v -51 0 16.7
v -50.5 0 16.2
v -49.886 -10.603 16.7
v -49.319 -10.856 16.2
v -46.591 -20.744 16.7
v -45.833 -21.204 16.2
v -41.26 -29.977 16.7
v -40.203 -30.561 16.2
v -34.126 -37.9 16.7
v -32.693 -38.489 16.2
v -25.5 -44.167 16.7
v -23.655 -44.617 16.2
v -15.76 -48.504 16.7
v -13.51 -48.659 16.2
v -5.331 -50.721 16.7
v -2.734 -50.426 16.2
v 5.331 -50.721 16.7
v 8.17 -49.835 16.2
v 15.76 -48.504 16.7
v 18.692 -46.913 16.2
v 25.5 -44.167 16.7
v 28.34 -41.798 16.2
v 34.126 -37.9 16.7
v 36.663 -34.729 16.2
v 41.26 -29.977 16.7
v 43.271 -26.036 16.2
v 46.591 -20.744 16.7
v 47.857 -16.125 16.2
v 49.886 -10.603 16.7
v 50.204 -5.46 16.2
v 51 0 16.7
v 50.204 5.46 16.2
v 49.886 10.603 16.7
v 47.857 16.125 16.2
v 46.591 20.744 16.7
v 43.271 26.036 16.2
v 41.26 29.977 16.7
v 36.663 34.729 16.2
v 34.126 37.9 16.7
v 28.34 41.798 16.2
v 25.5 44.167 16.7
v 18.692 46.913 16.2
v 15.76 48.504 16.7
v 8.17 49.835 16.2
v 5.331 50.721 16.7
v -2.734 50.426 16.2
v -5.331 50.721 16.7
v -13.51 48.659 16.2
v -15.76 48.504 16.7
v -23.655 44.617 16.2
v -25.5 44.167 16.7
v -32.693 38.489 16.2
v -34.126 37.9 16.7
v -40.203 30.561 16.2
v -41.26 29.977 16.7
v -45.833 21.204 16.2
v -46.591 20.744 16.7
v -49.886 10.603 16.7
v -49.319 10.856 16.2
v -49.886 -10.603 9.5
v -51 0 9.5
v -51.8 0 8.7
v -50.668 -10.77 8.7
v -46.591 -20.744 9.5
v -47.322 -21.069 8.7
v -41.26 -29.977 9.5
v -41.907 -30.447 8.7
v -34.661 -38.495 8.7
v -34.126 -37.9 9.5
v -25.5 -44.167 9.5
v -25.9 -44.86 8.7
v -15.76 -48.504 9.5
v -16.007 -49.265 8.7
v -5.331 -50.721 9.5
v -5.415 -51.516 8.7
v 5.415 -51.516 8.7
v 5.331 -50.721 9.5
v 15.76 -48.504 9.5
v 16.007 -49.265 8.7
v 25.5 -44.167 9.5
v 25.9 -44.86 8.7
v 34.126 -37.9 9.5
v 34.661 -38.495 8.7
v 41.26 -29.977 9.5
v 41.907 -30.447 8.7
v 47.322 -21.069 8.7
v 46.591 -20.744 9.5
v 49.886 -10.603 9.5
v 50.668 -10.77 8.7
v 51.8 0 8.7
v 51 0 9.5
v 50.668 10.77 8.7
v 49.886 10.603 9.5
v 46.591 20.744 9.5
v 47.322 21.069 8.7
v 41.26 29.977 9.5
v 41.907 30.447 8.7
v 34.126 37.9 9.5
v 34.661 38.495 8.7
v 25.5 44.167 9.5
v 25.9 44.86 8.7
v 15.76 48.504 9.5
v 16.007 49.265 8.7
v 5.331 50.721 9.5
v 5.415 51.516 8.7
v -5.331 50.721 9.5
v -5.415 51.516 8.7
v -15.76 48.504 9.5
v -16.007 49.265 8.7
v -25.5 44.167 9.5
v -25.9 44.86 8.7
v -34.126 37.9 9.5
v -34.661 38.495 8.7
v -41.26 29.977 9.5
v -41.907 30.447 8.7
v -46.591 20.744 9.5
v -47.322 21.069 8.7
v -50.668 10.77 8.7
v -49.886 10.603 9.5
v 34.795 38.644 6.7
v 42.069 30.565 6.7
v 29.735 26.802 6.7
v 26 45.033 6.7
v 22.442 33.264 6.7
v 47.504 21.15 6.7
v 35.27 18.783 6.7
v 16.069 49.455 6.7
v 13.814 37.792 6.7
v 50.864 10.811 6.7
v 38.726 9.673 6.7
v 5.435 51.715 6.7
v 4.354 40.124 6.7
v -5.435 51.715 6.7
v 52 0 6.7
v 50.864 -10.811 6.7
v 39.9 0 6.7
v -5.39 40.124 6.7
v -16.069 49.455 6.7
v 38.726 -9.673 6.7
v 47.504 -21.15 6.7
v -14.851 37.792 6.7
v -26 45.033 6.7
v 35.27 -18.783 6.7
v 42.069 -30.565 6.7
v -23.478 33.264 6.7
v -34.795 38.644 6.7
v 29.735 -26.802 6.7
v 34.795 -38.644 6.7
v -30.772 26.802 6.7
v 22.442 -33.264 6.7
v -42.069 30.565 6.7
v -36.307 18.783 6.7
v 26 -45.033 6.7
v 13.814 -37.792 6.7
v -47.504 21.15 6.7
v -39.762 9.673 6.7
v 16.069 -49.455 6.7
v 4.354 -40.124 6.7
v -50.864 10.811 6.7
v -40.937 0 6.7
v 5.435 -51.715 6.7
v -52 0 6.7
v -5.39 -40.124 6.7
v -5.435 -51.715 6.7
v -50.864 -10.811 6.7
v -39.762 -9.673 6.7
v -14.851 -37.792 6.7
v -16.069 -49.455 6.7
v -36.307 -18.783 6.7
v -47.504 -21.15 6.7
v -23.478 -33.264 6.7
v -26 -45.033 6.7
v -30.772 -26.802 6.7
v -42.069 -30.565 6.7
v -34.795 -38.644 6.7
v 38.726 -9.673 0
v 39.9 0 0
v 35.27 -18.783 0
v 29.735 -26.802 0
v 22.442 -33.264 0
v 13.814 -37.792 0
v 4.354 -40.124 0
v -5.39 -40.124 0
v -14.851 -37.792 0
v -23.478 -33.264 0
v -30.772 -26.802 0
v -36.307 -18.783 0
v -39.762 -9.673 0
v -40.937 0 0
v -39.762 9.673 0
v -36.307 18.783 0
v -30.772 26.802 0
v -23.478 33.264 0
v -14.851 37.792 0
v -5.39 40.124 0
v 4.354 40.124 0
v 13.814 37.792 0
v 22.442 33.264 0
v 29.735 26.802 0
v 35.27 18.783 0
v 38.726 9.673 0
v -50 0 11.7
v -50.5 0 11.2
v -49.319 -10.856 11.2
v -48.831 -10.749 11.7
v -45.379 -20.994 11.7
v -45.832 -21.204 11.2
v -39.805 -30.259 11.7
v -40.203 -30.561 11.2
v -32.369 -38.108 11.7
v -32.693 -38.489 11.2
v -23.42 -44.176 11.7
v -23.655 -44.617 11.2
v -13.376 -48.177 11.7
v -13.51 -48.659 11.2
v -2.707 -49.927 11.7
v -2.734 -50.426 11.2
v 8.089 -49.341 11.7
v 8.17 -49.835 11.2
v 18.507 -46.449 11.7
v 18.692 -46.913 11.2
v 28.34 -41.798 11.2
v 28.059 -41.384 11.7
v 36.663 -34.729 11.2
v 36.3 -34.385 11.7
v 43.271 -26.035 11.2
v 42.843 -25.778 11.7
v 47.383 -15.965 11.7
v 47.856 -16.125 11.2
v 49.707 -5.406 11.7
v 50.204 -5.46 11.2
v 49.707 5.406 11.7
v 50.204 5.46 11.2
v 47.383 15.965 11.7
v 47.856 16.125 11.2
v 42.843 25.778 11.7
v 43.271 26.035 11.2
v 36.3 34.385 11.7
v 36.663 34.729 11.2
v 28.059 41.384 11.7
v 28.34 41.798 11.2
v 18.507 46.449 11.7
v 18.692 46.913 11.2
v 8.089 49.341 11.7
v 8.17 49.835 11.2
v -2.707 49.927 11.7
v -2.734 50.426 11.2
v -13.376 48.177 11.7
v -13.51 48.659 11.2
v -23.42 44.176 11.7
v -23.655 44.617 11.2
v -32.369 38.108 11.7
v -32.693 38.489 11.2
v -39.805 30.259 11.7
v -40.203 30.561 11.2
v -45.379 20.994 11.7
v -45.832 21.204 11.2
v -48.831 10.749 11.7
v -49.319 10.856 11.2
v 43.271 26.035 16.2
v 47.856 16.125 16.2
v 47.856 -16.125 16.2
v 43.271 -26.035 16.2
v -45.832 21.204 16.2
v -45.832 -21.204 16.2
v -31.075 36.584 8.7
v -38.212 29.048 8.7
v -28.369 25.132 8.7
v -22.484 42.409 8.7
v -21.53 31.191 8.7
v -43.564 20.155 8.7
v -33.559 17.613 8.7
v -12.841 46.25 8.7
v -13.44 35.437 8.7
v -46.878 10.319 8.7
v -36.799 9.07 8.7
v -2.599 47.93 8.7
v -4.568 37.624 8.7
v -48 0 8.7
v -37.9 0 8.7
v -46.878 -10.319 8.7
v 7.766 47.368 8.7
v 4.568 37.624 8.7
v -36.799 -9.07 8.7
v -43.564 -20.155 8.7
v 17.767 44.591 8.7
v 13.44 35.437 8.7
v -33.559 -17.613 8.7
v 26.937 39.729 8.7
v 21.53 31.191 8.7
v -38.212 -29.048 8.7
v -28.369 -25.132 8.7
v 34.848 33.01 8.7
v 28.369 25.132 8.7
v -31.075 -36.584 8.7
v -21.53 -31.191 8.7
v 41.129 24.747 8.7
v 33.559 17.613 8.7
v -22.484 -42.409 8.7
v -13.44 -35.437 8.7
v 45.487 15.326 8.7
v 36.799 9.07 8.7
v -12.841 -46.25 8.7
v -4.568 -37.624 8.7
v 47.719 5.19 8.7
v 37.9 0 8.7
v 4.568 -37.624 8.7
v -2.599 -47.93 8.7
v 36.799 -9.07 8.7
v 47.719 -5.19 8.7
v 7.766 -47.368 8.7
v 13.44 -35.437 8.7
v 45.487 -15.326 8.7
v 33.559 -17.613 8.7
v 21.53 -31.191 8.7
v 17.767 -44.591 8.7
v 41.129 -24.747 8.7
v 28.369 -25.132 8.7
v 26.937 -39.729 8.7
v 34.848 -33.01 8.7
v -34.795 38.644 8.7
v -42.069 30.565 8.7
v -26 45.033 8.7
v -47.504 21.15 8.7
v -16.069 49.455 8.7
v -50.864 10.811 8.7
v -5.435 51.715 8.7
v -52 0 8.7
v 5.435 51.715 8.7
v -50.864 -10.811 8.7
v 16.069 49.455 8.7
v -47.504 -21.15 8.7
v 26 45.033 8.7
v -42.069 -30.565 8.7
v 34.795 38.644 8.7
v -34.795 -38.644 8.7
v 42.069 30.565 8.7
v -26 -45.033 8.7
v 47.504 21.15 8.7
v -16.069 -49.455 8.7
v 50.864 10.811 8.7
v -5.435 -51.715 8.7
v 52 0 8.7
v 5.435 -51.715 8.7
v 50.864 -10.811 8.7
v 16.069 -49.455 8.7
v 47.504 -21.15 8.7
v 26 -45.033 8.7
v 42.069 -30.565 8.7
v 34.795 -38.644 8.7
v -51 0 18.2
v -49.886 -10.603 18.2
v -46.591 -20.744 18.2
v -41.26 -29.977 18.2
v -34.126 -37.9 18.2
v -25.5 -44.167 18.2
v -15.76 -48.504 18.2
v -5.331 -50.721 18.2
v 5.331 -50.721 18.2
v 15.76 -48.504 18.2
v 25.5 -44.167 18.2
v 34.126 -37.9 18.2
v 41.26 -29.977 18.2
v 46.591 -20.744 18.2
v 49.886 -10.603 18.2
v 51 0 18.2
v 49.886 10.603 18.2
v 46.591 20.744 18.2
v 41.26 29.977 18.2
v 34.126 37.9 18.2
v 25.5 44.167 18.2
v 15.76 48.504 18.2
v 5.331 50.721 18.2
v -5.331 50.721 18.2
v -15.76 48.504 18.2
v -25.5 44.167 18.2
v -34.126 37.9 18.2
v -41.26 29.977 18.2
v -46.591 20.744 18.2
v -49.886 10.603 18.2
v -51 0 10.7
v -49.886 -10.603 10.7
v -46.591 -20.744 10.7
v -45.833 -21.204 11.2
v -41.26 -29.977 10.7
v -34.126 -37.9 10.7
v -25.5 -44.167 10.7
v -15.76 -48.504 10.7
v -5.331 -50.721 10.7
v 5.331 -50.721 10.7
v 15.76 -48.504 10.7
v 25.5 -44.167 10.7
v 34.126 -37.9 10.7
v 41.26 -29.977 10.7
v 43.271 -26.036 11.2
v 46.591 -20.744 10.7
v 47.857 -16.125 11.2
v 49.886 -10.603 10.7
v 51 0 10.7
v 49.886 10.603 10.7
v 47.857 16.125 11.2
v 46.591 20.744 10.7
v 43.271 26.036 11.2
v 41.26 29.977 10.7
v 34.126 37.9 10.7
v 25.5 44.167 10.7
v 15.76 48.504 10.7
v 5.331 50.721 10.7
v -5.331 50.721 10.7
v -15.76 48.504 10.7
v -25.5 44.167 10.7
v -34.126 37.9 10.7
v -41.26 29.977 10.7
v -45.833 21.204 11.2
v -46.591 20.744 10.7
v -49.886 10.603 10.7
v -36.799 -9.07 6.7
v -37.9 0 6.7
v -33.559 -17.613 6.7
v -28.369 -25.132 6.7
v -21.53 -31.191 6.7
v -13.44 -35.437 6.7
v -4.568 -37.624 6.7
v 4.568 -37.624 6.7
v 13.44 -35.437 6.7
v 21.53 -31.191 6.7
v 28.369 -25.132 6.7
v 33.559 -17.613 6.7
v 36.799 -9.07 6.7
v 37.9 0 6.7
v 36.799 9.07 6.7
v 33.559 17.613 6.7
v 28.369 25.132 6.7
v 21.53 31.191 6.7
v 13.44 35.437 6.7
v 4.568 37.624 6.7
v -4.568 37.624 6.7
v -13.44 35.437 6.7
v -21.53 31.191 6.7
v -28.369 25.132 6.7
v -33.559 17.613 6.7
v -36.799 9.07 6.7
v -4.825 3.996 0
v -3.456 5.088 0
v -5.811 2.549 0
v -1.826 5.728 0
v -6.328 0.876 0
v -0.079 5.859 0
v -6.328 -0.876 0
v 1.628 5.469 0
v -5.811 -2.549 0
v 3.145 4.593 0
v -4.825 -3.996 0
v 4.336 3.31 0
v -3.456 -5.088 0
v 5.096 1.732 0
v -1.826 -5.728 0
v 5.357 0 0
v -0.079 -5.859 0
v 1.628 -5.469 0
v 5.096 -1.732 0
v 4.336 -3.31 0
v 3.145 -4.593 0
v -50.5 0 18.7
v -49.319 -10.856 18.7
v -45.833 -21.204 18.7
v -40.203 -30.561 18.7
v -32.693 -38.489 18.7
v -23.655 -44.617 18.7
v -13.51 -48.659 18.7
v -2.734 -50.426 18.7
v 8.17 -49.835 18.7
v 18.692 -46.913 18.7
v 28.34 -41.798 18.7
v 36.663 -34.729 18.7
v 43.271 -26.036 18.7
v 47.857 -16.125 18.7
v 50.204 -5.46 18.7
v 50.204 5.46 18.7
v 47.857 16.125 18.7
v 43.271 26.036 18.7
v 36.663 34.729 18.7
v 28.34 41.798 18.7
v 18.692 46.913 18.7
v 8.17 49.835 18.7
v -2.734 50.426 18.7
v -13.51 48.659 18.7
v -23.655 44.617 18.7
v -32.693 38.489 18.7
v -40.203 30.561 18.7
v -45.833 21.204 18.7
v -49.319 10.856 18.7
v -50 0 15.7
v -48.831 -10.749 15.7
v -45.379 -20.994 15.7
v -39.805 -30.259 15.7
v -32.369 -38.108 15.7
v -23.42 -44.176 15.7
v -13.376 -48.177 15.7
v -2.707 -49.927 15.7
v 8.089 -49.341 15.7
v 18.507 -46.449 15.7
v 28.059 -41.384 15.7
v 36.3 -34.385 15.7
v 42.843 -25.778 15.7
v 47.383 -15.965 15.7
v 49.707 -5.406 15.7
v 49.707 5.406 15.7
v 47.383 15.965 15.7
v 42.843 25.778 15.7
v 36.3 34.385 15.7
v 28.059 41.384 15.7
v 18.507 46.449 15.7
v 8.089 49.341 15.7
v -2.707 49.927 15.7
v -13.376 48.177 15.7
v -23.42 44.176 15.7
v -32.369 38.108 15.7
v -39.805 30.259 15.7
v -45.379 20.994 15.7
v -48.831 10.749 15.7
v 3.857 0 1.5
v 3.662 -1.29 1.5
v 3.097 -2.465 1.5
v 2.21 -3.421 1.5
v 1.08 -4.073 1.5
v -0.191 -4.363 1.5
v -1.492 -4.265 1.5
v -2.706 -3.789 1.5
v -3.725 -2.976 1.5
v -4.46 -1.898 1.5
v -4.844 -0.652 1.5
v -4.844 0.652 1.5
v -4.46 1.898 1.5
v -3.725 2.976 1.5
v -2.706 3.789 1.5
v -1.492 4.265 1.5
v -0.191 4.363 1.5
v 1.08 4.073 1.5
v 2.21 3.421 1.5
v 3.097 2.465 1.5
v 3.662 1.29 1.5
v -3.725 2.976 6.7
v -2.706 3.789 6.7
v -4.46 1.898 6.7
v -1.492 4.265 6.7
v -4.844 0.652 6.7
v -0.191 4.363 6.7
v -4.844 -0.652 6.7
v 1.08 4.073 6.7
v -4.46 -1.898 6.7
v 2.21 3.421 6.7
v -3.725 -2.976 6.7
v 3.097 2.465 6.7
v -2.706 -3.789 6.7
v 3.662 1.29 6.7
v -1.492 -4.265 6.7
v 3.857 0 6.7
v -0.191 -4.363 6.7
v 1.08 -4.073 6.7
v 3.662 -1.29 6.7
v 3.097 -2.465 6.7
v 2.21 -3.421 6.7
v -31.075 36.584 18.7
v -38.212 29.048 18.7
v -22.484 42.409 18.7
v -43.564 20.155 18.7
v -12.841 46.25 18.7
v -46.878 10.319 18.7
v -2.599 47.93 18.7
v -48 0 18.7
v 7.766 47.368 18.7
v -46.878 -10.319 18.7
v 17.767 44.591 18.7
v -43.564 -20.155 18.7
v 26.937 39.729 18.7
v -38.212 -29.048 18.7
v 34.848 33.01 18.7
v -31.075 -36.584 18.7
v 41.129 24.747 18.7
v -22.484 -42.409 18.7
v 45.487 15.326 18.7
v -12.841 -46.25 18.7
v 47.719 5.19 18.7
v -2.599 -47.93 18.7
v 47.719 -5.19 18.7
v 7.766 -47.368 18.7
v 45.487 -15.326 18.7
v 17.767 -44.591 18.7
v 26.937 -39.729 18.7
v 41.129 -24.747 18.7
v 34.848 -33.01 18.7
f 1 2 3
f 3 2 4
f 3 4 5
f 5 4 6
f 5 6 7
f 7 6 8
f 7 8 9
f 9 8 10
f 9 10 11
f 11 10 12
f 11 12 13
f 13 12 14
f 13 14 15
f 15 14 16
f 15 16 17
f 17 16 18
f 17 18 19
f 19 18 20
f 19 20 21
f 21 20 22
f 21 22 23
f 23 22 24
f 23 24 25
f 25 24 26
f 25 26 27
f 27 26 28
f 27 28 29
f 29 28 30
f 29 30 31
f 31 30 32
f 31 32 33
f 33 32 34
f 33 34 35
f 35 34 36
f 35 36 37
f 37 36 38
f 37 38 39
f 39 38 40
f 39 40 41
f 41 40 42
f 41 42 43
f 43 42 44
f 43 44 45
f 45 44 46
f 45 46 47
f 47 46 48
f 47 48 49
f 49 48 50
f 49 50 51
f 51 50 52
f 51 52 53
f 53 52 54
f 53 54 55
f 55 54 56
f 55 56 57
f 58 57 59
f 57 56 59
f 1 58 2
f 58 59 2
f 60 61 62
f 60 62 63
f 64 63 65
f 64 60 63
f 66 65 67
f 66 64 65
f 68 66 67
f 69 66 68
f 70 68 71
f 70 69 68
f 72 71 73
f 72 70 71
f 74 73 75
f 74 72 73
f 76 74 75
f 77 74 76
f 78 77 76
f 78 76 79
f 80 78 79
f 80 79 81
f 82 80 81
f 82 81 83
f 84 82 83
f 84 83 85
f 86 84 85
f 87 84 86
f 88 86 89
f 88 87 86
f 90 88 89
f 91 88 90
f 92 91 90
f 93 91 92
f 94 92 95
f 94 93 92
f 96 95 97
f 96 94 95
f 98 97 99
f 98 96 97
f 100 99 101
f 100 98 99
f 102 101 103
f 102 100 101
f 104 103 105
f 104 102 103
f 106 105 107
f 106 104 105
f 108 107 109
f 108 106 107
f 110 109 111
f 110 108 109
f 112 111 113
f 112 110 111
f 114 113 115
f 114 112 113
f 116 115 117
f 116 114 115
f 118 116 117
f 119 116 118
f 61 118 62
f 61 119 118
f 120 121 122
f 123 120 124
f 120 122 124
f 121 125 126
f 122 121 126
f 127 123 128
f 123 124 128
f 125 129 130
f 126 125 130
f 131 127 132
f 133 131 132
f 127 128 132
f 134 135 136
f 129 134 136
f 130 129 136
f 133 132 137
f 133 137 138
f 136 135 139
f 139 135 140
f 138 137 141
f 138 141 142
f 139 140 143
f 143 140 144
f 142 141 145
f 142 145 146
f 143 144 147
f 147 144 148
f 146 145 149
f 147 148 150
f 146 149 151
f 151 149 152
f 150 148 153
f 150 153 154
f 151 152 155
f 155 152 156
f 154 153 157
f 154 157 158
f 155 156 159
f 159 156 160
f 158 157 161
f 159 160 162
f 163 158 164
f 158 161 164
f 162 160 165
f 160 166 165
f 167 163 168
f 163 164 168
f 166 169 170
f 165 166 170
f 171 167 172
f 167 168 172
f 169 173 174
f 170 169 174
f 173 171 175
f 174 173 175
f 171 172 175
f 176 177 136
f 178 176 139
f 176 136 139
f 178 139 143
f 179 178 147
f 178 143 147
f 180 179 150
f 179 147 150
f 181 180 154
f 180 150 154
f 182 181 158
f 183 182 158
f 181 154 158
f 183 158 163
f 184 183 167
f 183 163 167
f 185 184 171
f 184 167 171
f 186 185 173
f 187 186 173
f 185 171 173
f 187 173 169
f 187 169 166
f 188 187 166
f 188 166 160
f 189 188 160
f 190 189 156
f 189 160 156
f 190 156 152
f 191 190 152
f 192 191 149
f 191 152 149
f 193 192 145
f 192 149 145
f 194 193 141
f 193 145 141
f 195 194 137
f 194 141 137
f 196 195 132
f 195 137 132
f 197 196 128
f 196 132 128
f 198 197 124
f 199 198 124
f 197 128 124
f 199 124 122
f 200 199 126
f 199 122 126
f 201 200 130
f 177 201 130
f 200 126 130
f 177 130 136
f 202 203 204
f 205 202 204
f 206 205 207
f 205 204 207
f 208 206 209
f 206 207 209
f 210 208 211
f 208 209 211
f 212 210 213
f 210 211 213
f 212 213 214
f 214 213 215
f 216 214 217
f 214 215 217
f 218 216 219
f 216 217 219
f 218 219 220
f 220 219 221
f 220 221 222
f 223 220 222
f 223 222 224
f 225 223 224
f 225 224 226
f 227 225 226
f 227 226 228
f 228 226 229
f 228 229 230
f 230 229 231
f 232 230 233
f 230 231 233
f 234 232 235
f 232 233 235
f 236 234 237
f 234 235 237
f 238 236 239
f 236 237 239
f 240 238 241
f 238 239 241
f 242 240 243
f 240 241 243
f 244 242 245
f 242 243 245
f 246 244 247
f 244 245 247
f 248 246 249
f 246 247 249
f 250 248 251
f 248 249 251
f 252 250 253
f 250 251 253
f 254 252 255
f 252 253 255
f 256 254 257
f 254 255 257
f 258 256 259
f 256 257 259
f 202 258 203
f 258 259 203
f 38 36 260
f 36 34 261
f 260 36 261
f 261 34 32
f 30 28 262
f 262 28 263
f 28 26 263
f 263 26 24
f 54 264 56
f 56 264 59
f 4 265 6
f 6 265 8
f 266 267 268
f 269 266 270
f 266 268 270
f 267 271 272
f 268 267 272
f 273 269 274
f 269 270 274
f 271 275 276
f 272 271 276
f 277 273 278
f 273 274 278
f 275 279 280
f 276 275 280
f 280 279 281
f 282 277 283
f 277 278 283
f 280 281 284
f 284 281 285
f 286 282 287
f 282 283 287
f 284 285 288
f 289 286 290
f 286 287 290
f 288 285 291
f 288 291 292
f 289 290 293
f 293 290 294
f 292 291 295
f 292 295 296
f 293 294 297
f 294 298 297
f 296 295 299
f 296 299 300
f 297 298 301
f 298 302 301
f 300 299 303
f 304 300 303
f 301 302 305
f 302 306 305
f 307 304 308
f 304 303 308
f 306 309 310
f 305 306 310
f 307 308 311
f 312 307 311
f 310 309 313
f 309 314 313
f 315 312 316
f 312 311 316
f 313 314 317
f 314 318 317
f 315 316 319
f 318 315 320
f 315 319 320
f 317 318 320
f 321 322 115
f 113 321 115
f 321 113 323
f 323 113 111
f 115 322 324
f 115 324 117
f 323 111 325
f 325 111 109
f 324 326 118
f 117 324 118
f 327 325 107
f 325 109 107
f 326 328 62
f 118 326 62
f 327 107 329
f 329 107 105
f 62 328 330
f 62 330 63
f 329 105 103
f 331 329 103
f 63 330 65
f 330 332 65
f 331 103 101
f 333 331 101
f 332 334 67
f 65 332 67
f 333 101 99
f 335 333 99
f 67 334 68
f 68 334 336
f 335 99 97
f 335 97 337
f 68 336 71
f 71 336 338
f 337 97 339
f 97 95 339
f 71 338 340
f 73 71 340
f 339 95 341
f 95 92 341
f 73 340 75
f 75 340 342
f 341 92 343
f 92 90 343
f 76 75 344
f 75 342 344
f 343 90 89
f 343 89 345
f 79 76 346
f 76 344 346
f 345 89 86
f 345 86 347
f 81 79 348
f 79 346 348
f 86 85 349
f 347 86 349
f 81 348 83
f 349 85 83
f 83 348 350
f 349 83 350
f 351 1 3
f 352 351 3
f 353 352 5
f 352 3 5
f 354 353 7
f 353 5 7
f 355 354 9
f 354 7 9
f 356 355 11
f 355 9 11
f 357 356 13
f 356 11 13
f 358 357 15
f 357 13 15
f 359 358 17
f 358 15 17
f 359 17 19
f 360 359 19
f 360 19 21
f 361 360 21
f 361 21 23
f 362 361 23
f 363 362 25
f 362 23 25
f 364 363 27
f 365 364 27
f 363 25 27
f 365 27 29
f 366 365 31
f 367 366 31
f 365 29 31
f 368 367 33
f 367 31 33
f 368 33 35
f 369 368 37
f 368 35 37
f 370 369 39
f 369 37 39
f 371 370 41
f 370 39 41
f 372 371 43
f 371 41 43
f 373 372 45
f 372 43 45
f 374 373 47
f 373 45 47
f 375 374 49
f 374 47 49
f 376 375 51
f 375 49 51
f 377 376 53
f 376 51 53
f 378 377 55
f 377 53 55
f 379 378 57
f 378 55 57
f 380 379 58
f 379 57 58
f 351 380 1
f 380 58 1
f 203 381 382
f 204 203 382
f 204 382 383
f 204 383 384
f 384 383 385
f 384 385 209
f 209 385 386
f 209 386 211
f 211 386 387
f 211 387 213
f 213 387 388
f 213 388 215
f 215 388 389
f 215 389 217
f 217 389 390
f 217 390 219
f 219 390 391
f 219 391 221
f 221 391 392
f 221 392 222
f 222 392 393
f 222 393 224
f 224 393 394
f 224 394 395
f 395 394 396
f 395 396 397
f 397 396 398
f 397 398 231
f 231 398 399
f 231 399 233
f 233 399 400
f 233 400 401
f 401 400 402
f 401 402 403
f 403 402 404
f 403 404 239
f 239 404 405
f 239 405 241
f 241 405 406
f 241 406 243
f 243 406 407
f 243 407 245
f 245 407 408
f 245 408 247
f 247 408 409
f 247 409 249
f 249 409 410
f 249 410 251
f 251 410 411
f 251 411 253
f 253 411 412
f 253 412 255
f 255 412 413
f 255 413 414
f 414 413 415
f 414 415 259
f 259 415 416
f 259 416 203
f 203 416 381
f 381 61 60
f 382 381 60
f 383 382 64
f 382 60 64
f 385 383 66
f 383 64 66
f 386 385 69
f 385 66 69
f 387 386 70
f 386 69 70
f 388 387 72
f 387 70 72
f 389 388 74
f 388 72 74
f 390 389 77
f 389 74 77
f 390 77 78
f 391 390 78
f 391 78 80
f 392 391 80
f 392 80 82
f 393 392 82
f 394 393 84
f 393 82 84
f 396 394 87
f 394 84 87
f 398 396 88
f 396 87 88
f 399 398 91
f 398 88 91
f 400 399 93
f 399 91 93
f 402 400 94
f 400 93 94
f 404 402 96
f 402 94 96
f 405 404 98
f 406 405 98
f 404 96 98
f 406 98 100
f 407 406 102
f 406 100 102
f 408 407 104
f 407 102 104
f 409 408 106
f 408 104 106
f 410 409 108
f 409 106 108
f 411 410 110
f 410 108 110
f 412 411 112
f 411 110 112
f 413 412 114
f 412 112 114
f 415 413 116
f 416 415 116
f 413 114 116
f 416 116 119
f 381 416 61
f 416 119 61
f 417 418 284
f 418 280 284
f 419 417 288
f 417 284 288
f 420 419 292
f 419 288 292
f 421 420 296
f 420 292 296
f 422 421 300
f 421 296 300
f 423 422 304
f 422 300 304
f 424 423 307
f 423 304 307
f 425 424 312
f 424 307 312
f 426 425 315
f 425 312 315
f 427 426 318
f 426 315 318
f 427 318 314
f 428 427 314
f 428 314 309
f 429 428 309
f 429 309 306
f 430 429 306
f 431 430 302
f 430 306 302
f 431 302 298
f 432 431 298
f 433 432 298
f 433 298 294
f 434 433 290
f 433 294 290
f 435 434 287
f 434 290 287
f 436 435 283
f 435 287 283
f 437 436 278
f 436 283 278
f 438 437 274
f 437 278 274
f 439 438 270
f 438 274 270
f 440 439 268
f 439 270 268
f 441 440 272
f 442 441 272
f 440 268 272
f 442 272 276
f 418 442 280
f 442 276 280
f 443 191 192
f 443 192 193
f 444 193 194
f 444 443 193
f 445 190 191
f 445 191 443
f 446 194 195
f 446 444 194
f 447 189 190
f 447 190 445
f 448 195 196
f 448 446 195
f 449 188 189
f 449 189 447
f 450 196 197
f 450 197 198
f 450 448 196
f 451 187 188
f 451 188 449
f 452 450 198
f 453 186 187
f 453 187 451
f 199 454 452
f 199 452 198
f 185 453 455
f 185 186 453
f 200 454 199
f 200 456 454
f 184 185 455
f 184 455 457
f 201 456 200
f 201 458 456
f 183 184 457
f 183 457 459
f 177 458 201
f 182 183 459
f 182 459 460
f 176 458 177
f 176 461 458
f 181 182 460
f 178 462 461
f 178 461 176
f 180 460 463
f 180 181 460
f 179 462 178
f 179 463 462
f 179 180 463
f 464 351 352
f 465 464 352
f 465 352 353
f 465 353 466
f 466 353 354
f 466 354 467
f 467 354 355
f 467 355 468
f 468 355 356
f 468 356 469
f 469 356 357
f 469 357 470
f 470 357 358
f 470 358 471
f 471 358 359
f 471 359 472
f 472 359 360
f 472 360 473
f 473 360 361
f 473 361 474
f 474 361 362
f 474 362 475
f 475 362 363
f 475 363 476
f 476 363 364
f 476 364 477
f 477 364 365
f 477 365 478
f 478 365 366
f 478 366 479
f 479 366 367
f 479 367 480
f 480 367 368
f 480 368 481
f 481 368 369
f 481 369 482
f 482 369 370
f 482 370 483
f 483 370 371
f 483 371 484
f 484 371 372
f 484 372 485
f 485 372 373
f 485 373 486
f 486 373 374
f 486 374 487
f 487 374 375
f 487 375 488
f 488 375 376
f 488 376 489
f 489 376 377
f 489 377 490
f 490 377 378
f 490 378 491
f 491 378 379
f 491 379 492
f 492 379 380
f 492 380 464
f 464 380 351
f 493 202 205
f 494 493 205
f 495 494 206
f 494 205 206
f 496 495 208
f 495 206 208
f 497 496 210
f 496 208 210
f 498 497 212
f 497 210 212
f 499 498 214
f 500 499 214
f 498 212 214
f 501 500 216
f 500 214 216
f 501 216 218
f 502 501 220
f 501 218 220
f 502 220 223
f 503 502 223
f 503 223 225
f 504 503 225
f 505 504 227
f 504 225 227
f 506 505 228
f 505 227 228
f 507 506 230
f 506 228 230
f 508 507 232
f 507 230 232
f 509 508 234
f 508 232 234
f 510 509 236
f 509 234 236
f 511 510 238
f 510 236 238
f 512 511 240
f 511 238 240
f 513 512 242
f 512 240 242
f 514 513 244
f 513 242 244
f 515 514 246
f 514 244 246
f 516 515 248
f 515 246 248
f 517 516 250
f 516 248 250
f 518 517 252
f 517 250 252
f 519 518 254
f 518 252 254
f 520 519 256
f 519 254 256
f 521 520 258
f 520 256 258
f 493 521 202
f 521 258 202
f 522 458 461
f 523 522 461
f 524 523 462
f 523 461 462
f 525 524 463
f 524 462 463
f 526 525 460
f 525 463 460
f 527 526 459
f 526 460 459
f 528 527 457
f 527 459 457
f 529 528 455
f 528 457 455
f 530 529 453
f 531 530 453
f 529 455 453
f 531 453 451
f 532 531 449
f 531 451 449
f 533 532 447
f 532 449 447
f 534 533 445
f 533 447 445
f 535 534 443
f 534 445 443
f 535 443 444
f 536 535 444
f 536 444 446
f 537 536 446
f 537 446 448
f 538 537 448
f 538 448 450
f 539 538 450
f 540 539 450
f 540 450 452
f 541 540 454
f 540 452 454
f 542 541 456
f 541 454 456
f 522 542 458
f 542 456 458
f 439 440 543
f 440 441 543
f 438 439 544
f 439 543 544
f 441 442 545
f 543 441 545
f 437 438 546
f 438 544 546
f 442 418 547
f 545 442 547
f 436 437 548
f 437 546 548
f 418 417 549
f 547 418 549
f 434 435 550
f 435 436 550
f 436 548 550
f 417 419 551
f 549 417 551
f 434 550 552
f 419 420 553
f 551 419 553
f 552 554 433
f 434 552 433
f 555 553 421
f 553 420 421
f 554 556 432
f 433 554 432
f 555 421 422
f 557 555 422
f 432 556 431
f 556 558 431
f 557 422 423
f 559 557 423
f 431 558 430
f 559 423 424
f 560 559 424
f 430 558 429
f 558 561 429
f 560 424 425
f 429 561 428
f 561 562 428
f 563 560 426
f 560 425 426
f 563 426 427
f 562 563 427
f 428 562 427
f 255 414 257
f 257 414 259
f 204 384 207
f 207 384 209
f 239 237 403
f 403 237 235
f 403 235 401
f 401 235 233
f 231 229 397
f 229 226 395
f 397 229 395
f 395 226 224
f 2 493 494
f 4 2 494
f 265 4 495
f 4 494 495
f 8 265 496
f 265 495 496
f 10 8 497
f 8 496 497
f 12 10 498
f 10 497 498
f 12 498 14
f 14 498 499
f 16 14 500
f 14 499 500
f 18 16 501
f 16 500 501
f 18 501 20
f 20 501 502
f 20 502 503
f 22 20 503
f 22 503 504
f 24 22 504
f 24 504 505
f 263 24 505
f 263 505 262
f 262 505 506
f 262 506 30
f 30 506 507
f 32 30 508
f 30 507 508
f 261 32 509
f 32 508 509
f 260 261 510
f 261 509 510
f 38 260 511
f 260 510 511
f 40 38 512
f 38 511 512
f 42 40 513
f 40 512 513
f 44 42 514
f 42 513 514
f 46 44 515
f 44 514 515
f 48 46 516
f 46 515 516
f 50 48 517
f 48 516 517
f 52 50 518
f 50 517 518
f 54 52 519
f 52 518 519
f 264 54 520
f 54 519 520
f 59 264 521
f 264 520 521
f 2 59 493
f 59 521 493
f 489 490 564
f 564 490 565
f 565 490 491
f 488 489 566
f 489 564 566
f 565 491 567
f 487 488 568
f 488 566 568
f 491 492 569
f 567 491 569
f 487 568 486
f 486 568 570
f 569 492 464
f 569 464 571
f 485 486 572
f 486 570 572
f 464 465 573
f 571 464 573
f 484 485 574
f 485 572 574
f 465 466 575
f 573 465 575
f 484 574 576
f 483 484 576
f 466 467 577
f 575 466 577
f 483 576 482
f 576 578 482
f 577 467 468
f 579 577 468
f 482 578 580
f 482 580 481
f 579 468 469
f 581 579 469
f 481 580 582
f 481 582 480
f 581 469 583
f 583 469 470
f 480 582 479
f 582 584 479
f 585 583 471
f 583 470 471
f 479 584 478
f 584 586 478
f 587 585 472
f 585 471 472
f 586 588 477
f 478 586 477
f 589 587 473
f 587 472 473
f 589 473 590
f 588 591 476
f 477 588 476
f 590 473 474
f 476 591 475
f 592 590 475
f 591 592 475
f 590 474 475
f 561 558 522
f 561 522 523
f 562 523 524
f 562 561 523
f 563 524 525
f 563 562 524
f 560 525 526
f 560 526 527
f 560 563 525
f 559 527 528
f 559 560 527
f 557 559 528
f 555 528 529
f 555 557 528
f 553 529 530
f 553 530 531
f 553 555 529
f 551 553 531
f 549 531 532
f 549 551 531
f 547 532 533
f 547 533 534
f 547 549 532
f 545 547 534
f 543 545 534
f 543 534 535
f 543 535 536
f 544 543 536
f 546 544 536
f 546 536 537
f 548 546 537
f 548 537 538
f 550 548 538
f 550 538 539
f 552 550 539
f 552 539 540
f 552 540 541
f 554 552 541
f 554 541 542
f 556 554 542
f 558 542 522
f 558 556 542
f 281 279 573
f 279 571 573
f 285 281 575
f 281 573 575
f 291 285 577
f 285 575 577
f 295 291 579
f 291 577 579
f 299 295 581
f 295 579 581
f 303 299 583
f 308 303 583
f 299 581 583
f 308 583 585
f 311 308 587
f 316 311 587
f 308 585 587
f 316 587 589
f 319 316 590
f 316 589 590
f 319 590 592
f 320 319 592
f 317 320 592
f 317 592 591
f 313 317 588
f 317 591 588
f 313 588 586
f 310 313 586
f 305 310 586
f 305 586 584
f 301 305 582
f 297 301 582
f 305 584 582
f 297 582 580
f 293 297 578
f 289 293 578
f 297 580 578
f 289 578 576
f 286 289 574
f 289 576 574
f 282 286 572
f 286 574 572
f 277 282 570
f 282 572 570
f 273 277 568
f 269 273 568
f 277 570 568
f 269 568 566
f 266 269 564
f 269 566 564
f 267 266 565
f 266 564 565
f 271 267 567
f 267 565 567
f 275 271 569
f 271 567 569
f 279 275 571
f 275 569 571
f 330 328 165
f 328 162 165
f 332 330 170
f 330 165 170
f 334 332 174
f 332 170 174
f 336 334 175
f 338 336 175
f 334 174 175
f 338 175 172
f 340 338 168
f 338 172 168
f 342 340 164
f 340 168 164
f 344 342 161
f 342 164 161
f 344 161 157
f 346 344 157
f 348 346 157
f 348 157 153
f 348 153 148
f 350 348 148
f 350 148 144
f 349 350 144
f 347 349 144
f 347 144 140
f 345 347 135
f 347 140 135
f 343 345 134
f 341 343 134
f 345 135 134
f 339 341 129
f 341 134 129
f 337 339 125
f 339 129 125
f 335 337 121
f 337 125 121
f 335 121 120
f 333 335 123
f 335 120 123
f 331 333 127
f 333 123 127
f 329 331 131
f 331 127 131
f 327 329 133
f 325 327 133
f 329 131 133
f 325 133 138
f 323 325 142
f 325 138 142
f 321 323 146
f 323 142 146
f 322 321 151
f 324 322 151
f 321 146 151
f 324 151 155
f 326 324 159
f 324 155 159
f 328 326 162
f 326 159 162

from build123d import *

# Parameters (mm, degrees)
CHAMFER1_SIZE       = 0.5
CHAMFER2_SIZE       = 0.8
SKETCH3_R           = 40.418258265
SKETCH3_R_2         = 4.375
BOSS_EXTRUDE1_DEPTH = 6.7
CHAMFER3_SIZE       = 1.5


with BuildPart() as part:
    # Sketch1 → Revolve1 (revolve)
    with BuildSketch(Plane(origin=(0, 0, 0), x_dir=(1, 0, 0), z_dir=(0, 1, 0)), mode=Mode.PRIVATE) as revolve1_sk:
        Polygon((37.9, 0), (37.9, -8.7), (48, -8.7), (48, -18.7), (51, -18.7), (51, -16.2), (50, -16.2), (50, -11.2), (51, -11.2), (51, -8.7), (52, -8.7), (52, -6.7), (39.9, -6.7), (39.9, 0), align=None)
    revolve(revolve1_sk.sketch.rotate(Axis((0, 0, -73.981367368), (0, 0, 1)), 180), axis=Axis((0, 0, -73.981367368), (0, 0, 1)))

    # Chamfer1
    chamfer1_edges = [part.edges().sort_by_distance(p)[0] for p in [
        (51, 0, 11.2),
        (50, 0, 11.2),
        (50, 0, 16.2),
        (51, 0, 16.2),
        (51, 0, 18.7),
        (39.9, 0, 0),
    ]]
    chamfer(chamfer1_edges, length=CHAMFER1_SIZE - 0.0001)  # a hair under: the kernel refuses the full size

    # Chamfer2
    chamfer2_edges = [part.edges().sort_by_distance(p)[0] for p in [
        (51, 0, 8.7),
    ]]
    chamfer(chamfer2_edges, length=CHAMFER2_SIZE)

    # Sketch3 → Boss-Extrude1 (add)
    with BuildSketch(Plane(origin=(0, 0, 6.7), x_dir=(-1, 0, 0), z_dir=(0, 0, -1))):
        with Locations(Location((0.518258265, 0, 0), (0, 0, 180))):
            Circle(SKETCH3_R)
        with Locations(Location((0.518258265, 0, 0), (0, 0, 180))):
            Circle(SKETCH3_R_2, mode=Mode.SUBTRACT)
    extrude(amount=BOSS_EXTRUDE1_DEPTH)

    # Chamfer3
    chamfer3_edges = [part.edges().sort_by_distance(p)[0] for p in [
        (-4.893258265, 0, 0),
    ]]
    chamfer(chamfer3_edges, length=CHAMFER3_SIZE)


solid = part.part
